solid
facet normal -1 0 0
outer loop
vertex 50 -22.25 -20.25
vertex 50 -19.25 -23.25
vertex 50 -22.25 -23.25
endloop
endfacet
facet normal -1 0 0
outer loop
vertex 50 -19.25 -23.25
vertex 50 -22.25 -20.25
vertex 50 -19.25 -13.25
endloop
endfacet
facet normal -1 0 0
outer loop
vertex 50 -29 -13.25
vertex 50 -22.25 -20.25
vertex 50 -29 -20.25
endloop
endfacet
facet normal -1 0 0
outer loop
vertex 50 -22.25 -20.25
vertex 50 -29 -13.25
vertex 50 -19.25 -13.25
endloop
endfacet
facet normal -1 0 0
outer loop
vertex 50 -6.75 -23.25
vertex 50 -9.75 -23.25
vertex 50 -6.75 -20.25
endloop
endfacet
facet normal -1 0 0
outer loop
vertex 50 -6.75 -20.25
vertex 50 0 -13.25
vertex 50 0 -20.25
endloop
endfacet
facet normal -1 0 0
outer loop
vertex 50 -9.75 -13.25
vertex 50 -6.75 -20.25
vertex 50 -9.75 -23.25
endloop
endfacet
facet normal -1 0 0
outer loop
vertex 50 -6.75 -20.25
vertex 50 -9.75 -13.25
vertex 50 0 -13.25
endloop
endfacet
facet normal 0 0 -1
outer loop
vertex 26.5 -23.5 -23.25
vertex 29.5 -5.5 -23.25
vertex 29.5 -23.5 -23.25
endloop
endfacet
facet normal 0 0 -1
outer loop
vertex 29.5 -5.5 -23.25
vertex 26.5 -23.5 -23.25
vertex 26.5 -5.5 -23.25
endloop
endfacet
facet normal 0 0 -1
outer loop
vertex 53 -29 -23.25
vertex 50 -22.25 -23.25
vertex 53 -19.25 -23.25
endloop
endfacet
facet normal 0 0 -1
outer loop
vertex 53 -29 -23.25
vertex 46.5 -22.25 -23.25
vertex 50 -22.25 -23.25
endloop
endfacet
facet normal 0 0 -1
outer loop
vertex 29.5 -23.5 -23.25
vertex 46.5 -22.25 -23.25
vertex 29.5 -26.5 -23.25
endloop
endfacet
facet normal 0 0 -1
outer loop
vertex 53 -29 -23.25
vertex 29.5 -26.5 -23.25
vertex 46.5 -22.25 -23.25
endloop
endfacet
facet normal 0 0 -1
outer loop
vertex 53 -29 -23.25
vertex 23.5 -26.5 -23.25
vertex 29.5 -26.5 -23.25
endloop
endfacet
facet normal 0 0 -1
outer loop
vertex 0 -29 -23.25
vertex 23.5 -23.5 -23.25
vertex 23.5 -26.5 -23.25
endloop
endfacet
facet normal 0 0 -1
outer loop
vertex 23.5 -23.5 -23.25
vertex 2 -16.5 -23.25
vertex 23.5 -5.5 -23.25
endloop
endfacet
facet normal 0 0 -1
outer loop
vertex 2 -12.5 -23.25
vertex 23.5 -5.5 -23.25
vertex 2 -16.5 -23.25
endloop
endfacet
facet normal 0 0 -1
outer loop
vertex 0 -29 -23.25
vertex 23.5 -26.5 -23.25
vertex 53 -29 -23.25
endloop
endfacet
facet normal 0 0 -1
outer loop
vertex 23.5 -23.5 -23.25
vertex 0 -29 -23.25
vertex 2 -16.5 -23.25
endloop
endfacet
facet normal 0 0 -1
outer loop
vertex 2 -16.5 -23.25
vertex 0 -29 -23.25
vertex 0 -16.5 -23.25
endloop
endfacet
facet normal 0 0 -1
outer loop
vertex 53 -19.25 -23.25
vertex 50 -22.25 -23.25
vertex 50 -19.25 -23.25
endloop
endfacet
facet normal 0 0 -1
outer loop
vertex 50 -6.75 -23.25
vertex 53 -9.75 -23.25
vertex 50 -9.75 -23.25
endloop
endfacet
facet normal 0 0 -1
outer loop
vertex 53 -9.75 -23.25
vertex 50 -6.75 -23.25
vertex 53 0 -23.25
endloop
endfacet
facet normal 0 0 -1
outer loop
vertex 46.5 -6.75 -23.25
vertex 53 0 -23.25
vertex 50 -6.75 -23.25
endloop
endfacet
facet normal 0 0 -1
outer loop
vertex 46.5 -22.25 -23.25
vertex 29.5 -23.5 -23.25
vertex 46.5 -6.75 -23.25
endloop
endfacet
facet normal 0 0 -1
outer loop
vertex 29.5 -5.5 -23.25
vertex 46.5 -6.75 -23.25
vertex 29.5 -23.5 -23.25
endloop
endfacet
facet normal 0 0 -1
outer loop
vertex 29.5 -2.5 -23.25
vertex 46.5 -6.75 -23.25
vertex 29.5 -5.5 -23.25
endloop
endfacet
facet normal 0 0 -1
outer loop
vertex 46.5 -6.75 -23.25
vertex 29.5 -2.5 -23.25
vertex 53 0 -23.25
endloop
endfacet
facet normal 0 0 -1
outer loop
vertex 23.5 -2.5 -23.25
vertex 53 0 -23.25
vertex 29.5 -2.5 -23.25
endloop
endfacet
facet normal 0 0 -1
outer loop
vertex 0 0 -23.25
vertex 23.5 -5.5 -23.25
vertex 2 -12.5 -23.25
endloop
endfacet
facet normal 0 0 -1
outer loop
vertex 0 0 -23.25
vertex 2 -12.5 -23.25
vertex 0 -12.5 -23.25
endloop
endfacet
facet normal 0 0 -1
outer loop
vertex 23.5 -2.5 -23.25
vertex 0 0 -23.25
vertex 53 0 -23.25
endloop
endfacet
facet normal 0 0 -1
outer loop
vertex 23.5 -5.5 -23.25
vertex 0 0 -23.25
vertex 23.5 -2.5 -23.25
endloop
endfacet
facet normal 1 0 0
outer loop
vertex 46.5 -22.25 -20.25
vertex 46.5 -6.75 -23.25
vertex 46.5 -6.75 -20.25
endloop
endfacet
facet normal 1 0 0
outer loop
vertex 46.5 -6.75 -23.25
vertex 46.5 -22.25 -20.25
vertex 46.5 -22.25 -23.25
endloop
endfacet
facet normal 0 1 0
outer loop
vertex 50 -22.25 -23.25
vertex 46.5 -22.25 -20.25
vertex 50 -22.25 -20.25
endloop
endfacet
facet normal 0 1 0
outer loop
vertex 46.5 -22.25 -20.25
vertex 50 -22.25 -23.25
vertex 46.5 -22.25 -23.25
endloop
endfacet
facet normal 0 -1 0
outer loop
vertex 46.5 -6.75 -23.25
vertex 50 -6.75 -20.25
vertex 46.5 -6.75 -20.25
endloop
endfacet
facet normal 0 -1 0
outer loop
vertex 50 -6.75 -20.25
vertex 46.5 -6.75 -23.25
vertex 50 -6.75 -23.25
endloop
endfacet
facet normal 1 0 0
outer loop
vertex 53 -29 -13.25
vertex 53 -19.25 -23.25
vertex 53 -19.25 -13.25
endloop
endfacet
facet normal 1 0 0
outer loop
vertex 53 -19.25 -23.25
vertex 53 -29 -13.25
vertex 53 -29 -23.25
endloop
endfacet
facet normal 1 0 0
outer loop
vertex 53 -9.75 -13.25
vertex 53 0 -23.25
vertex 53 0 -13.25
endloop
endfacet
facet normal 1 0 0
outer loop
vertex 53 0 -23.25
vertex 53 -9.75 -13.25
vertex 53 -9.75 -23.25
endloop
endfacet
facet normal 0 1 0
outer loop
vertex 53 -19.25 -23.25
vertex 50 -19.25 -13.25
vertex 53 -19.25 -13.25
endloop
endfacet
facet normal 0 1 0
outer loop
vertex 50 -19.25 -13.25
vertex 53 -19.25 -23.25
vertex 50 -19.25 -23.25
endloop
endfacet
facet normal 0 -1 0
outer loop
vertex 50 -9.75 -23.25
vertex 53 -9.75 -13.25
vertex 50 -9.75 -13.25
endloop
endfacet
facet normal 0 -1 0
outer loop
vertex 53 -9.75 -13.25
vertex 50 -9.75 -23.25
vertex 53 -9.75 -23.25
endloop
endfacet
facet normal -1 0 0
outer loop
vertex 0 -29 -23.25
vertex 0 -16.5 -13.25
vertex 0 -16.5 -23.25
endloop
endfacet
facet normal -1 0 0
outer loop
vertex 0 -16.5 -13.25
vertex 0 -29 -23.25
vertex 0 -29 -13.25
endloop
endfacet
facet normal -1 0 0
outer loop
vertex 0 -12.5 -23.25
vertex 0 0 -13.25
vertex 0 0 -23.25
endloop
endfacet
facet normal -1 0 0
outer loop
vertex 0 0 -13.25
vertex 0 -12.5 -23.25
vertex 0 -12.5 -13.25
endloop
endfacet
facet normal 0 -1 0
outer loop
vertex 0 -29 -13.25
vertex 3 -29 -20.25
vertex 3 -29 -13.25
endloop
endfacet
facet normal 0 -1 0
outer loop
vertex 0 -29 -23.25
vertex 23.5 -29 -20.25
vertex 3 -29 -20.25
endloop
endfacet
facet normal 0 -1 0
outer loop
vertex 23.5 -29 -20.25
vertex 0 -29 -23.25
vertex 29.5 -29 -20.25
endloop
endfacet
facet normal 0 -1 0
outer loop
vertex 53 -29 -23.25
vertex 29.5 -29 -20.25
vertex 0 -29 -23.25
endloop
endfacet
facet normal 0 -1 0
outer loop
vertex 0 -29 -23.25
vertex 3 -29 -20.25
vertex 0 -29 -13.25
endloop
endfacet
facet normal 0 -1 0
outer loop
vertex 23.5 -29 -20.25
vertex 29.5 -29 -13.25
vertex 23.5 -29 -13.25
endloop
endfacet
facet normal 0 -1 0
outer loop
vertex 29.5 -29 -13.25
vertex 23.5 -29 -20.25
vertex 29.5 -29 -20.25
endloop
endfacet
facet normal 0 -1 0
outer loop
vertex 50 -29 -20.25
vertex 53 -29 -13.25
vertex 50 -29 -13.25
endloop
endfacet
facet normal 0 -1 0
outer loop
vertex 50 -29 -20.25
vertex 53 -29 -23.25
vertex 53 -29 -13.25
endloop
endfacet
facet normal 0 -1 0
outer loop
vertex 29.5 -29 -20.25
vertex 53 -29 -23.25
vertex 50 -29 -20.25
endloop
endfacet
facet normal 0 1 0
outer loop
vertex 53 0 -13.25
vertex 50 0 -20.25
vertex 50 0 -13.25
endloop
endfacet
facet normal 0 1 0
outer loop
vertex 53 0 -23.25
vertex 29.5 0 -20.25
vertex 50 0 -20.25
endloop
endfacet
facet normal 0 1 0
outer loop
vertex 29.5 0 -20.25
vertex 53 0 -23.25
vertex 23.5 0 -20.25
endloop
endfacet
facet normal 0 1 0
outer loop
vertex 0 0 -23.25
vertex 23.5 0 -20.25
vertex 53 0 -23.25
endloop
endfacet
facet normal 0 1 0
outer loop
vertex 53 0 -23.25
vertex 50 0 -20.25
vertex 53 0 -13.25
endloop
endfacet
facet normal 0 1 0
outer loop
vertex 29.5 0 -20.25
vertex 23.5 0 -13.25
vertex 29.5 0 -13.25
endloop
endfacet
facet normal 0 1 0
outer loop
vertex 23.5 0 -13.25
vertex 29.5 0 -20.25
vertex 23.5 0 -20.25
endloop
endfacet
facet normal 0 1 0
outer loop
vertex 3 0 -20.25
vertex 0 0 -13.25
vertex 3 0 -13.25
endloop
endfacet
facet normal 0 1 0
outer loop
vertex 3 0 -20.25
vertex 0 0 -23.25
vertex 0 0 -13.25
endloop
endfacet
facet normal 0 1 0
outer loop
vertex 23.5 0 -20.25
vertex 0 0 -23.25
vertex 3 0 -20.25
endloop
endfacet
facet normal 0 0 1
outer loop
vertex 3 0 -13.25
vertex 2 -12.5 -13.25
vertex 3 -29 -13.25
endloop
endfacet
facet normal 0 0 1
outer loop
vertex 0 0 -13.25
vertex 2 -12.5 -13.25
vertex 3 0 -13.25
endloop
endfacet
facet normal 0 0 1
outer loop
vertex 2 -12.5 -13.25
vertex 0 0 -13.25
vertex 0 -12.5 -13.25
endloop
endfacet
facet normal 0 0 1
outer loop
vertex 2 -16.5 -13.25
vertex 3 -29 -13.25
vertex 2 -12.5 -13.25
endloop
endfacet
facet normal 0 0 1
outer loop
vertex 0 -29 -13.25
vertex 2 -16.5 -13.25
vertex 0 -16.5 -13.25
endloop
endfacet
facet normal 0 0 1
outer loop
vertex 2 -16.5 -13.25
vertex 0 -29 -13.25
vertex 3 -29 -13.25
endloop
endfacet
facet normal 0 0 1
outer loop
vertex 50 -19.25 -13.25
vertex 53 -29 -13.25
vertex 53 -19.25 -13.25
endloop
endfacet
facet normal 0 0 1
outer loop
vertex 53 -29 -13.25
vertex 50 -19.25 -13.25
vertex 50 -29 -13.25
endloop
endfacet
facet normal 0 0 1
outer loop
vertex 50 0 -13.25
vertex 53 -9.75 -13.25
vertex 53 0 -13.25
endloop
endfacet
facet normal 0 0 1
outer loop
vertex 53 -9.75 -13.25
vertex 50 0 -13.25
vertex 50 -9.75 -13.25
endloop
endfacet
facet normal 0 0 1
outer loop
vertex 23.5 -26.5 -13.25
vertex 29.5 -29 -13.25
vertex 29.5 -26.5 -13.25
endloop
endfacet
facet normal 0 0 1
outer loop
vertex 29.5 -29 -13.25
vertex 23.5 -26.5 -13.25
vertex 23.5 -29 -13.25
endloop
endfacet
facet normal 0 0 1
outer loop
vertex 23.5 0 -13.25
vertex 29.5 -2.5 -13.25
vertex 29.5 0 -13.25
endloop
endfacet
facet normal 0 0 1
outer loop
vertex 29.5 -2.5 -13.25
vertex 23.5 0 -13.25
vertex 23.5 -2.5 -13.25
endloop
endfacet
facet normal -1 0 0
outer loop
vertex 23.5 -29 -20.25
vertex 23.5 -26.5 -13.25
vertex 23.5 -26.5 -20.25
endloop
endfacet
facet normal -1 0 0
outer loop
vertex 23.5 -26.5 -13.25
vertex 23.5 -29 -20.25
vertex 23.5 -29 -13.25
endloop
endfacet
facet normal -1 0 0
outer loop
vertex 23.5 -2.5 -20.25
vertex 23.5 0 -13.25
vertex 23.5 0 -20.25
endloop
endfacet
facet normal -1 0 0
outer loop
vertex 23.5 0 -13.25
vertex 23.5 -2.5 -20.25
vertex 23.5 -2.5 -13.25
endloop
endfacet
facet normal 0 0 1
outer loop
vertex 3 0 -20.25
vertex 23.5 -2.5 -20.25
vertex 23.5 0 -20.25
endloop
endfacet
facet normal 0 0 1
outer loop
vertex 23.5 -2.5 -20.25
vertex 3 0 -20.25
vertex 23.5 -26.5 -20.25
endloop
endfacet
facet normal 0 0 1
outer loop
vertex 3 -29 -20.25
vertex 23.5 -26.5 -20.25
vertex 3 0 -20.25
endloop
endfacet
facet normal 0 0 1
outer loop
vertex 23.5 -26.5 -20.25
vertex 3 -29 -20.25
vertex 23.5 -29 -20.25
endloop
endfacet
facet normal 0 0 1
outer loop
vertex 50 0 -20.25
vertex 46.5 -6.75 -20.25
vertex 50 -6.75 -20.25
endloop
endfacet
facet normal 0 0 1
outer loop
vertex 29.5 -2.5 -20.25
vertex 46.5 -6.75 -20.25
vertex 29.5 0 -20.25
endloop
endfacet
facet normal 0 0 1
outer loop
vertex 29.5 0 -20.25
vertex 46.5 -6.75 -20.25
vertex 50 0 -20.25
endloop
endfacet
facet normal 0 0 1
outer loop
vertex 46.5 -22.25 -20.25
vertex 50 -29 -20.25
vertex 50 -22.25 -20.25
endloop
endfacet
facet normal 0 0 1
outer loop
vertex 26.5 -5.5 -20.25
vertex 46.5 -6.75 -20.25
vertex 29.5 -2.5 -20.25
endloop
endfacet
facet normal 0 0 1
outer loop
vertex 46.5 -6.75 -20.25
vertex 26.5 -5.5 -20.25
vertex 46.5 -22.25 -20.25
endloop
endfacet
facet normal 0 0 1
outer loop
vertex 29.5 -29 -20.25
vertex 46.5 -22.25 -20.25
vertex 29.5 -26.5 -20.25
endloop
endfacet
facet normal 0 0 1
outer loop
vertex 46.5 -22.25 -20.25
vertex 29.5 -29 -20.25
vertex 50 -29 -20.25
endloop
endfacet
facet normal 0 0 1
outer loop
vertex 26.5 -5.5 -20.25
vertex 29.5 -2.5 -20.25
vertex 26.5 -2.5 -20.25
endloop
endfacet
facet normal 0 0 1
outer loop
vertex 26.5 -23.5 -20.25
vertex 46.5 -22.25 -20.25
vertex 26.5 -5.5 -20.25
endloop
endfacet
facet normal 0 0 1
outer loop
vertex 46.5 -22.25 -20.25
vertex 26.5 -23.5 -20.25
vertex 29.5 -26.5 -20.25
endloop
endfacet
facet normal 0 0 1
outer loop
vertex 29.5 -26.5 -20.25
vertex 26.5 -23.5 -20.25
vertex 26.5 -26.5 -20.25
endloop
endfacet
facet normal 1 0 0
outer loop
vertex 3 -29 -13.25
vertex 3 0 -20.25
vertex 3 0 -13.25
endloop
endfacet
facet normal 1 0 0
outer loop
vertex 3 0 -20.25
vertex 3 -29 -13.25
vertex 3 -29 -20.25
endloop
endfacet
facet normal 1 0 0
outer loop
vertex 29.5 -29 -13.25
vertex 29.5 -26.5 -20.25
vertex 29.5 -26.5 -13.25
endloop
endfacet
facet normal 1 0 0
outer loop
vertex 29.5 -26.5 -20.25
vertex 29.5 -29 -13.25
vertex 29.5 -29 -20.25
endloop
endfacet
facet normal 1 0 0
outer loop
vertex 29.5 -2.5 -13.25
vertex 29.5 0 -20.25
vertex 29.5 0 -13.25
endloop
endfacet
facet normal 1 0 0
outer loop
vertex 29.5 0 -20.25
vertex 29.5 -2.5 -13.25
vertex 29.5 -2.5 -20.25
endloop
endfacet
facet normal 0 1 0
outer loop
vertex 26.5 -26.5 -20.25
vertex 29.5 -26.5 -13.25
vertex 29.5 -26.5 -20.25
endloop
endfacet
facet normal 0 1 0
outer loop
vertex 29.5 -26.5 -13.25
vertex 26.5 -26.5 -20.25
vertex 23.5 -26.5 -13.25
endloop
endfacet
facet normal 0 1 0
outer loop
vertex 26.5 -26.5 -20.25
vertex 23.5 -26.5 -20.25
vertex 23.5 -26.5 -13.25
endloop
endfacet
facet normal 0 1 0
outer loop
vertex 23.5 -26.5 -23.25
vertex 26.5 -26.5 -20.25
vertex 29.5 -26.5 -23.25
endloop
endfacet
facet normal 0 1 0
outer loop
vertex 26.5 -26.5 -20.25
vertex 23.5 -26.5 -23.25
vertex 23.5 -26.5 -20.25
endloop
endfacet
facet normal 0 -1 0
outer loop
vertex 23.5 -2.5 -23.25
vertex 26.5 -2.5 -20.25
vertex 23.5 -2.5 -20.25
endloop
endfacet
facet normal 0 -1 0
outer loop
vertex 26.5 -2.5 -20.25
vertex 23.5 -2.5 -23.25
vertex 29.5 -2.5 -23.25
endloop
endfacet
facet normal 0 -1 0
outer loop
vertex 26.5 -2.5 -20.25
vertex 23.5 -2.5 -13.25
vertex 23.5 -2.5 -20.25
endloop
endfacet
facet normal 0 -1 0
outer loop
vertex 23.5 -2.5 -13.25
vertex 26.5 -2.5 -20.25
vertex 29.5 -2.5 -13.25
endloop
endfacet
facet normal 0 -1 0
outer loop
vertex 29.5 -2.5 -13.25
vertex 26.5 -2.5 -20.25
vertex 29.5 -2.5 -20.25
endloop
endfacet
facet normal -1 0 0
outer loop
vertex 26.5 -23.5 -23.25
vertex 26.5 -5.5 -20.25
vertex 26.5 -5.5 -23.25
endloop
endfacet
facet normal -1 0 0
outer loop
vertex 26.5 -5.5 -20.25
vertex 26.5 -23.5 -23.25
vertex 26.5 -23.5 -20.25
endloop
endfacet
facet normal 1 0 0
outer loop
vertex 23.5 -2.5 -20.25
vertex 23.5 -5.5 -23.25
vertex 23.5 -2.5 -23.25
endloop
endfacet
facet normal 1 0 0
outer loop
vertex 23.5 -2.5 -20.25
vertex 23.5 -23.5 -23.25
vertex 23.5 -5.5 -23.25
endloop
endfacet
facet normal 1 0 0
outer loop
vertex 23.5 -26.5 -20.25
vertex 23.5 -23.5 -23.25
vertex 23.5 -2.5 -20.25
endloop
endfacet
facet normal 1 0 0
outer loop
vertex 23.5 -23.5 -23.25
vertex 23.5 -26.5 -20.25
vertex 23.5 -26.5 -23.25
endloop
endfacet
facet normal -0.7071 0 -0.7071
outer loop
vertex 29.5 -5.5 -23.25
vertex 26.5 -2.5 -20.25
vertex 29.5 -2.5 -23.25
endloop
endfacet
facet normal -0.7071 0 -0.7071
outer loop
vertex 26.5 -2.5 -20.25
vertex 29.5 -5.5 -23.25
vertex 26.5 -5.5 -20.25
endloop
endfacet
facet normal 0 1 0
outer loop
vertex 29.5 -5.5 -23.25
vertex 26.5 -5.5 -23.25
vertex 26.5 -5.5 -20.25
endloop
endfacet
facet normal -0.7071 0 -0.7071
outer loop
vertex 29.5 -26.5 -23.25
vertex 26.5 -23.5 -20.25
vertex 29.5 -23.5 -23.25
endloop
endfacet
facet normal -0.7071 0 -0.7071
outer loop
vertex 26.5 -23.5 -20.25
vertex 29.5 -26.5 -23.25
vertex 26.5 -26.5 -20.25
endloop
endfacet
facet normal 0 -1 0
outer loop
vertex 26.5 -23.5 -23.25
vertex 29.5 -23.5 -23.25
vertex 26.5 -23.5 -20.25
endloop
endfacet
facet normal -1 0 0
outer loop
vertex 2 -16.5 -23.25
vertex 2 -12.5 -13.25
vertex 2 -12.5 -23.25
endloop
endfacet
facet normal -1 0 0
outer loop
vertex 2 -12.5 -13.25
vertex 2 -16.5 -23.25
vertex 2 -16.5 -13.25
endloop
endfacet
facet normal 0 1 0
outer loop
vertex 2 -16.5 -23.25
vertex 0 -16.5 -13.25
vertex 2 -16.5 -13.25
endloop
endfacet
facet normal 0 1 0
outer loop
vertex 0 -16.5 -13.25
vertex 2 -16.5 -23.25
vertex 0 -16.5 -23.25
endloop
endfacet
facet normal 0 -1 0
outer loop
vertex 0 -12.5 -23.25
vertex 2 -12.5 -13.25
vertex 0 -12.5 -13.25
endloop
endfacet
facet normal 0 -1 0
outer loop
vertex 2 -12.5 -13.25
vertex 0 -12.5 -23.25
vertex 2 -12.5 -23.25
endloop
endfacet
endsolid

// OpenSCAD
a = 6; // Gap between bars
b = 20; // width of the bars
c = 29; // Width of whole thing
d = 24; // Width of slot
e = 3; // Outside wall thickness, and 45 degree area width
f = 200; // length of bar this must be in center of
g = 4; // Slot width for cable tie
t = 0.25; // tolerance

bar = [b+t+t, c, b+t];

rotate([180,0,0]) {
    difference() {
        // Main block
        cube([e+t+b+t+a+t+b+t+e, c, b+t+e]);
        // Trim the whole block to half height
        translate([0,0,-b/2]) cube([e+t+b+t+a+t+b+t+e, c, b+t+e]);
        // Slots for bars to fit in
        translate([e, 0, 0]) cube(bar);
        translate([e+t+b+t+a, 0, 0]) cube(bar);
        translate([e+t+b+t, (c-d)/2, 0]) cube([a, d, b+t]);
        // slot for line to go through
        translate([e+t+b+t, (c-d)/2, 0]) cube([a/2, d, b+t+e]);
        translate([e+t+b+t+a/2, (c-d)/2, b+t]) rotate([0,-45,0]) cube([b, e, b+t+e]);
        translate([e+t+b+t+a/2, (c-d)/2+d-e, b+t]) rotate([0,-45,0]) cube([b, e, b+t+e]);
        translate([0,(c-g)/2,0]) cube([g/2, g, b+t+e]);
        // Slot to fit adjustment strip
        translate([e+t+b+t+a+t+b+t+e,c/2,0]) {
            translate([-e-t-e-t,-2.5*e-t,0]) cube([t+e+t,t+5*e+t,b+t+e]);
            translate([-e,-1.5*e-t,0]) cube([e,t+3*e+t,b+t+e]);
        }
    }
}
